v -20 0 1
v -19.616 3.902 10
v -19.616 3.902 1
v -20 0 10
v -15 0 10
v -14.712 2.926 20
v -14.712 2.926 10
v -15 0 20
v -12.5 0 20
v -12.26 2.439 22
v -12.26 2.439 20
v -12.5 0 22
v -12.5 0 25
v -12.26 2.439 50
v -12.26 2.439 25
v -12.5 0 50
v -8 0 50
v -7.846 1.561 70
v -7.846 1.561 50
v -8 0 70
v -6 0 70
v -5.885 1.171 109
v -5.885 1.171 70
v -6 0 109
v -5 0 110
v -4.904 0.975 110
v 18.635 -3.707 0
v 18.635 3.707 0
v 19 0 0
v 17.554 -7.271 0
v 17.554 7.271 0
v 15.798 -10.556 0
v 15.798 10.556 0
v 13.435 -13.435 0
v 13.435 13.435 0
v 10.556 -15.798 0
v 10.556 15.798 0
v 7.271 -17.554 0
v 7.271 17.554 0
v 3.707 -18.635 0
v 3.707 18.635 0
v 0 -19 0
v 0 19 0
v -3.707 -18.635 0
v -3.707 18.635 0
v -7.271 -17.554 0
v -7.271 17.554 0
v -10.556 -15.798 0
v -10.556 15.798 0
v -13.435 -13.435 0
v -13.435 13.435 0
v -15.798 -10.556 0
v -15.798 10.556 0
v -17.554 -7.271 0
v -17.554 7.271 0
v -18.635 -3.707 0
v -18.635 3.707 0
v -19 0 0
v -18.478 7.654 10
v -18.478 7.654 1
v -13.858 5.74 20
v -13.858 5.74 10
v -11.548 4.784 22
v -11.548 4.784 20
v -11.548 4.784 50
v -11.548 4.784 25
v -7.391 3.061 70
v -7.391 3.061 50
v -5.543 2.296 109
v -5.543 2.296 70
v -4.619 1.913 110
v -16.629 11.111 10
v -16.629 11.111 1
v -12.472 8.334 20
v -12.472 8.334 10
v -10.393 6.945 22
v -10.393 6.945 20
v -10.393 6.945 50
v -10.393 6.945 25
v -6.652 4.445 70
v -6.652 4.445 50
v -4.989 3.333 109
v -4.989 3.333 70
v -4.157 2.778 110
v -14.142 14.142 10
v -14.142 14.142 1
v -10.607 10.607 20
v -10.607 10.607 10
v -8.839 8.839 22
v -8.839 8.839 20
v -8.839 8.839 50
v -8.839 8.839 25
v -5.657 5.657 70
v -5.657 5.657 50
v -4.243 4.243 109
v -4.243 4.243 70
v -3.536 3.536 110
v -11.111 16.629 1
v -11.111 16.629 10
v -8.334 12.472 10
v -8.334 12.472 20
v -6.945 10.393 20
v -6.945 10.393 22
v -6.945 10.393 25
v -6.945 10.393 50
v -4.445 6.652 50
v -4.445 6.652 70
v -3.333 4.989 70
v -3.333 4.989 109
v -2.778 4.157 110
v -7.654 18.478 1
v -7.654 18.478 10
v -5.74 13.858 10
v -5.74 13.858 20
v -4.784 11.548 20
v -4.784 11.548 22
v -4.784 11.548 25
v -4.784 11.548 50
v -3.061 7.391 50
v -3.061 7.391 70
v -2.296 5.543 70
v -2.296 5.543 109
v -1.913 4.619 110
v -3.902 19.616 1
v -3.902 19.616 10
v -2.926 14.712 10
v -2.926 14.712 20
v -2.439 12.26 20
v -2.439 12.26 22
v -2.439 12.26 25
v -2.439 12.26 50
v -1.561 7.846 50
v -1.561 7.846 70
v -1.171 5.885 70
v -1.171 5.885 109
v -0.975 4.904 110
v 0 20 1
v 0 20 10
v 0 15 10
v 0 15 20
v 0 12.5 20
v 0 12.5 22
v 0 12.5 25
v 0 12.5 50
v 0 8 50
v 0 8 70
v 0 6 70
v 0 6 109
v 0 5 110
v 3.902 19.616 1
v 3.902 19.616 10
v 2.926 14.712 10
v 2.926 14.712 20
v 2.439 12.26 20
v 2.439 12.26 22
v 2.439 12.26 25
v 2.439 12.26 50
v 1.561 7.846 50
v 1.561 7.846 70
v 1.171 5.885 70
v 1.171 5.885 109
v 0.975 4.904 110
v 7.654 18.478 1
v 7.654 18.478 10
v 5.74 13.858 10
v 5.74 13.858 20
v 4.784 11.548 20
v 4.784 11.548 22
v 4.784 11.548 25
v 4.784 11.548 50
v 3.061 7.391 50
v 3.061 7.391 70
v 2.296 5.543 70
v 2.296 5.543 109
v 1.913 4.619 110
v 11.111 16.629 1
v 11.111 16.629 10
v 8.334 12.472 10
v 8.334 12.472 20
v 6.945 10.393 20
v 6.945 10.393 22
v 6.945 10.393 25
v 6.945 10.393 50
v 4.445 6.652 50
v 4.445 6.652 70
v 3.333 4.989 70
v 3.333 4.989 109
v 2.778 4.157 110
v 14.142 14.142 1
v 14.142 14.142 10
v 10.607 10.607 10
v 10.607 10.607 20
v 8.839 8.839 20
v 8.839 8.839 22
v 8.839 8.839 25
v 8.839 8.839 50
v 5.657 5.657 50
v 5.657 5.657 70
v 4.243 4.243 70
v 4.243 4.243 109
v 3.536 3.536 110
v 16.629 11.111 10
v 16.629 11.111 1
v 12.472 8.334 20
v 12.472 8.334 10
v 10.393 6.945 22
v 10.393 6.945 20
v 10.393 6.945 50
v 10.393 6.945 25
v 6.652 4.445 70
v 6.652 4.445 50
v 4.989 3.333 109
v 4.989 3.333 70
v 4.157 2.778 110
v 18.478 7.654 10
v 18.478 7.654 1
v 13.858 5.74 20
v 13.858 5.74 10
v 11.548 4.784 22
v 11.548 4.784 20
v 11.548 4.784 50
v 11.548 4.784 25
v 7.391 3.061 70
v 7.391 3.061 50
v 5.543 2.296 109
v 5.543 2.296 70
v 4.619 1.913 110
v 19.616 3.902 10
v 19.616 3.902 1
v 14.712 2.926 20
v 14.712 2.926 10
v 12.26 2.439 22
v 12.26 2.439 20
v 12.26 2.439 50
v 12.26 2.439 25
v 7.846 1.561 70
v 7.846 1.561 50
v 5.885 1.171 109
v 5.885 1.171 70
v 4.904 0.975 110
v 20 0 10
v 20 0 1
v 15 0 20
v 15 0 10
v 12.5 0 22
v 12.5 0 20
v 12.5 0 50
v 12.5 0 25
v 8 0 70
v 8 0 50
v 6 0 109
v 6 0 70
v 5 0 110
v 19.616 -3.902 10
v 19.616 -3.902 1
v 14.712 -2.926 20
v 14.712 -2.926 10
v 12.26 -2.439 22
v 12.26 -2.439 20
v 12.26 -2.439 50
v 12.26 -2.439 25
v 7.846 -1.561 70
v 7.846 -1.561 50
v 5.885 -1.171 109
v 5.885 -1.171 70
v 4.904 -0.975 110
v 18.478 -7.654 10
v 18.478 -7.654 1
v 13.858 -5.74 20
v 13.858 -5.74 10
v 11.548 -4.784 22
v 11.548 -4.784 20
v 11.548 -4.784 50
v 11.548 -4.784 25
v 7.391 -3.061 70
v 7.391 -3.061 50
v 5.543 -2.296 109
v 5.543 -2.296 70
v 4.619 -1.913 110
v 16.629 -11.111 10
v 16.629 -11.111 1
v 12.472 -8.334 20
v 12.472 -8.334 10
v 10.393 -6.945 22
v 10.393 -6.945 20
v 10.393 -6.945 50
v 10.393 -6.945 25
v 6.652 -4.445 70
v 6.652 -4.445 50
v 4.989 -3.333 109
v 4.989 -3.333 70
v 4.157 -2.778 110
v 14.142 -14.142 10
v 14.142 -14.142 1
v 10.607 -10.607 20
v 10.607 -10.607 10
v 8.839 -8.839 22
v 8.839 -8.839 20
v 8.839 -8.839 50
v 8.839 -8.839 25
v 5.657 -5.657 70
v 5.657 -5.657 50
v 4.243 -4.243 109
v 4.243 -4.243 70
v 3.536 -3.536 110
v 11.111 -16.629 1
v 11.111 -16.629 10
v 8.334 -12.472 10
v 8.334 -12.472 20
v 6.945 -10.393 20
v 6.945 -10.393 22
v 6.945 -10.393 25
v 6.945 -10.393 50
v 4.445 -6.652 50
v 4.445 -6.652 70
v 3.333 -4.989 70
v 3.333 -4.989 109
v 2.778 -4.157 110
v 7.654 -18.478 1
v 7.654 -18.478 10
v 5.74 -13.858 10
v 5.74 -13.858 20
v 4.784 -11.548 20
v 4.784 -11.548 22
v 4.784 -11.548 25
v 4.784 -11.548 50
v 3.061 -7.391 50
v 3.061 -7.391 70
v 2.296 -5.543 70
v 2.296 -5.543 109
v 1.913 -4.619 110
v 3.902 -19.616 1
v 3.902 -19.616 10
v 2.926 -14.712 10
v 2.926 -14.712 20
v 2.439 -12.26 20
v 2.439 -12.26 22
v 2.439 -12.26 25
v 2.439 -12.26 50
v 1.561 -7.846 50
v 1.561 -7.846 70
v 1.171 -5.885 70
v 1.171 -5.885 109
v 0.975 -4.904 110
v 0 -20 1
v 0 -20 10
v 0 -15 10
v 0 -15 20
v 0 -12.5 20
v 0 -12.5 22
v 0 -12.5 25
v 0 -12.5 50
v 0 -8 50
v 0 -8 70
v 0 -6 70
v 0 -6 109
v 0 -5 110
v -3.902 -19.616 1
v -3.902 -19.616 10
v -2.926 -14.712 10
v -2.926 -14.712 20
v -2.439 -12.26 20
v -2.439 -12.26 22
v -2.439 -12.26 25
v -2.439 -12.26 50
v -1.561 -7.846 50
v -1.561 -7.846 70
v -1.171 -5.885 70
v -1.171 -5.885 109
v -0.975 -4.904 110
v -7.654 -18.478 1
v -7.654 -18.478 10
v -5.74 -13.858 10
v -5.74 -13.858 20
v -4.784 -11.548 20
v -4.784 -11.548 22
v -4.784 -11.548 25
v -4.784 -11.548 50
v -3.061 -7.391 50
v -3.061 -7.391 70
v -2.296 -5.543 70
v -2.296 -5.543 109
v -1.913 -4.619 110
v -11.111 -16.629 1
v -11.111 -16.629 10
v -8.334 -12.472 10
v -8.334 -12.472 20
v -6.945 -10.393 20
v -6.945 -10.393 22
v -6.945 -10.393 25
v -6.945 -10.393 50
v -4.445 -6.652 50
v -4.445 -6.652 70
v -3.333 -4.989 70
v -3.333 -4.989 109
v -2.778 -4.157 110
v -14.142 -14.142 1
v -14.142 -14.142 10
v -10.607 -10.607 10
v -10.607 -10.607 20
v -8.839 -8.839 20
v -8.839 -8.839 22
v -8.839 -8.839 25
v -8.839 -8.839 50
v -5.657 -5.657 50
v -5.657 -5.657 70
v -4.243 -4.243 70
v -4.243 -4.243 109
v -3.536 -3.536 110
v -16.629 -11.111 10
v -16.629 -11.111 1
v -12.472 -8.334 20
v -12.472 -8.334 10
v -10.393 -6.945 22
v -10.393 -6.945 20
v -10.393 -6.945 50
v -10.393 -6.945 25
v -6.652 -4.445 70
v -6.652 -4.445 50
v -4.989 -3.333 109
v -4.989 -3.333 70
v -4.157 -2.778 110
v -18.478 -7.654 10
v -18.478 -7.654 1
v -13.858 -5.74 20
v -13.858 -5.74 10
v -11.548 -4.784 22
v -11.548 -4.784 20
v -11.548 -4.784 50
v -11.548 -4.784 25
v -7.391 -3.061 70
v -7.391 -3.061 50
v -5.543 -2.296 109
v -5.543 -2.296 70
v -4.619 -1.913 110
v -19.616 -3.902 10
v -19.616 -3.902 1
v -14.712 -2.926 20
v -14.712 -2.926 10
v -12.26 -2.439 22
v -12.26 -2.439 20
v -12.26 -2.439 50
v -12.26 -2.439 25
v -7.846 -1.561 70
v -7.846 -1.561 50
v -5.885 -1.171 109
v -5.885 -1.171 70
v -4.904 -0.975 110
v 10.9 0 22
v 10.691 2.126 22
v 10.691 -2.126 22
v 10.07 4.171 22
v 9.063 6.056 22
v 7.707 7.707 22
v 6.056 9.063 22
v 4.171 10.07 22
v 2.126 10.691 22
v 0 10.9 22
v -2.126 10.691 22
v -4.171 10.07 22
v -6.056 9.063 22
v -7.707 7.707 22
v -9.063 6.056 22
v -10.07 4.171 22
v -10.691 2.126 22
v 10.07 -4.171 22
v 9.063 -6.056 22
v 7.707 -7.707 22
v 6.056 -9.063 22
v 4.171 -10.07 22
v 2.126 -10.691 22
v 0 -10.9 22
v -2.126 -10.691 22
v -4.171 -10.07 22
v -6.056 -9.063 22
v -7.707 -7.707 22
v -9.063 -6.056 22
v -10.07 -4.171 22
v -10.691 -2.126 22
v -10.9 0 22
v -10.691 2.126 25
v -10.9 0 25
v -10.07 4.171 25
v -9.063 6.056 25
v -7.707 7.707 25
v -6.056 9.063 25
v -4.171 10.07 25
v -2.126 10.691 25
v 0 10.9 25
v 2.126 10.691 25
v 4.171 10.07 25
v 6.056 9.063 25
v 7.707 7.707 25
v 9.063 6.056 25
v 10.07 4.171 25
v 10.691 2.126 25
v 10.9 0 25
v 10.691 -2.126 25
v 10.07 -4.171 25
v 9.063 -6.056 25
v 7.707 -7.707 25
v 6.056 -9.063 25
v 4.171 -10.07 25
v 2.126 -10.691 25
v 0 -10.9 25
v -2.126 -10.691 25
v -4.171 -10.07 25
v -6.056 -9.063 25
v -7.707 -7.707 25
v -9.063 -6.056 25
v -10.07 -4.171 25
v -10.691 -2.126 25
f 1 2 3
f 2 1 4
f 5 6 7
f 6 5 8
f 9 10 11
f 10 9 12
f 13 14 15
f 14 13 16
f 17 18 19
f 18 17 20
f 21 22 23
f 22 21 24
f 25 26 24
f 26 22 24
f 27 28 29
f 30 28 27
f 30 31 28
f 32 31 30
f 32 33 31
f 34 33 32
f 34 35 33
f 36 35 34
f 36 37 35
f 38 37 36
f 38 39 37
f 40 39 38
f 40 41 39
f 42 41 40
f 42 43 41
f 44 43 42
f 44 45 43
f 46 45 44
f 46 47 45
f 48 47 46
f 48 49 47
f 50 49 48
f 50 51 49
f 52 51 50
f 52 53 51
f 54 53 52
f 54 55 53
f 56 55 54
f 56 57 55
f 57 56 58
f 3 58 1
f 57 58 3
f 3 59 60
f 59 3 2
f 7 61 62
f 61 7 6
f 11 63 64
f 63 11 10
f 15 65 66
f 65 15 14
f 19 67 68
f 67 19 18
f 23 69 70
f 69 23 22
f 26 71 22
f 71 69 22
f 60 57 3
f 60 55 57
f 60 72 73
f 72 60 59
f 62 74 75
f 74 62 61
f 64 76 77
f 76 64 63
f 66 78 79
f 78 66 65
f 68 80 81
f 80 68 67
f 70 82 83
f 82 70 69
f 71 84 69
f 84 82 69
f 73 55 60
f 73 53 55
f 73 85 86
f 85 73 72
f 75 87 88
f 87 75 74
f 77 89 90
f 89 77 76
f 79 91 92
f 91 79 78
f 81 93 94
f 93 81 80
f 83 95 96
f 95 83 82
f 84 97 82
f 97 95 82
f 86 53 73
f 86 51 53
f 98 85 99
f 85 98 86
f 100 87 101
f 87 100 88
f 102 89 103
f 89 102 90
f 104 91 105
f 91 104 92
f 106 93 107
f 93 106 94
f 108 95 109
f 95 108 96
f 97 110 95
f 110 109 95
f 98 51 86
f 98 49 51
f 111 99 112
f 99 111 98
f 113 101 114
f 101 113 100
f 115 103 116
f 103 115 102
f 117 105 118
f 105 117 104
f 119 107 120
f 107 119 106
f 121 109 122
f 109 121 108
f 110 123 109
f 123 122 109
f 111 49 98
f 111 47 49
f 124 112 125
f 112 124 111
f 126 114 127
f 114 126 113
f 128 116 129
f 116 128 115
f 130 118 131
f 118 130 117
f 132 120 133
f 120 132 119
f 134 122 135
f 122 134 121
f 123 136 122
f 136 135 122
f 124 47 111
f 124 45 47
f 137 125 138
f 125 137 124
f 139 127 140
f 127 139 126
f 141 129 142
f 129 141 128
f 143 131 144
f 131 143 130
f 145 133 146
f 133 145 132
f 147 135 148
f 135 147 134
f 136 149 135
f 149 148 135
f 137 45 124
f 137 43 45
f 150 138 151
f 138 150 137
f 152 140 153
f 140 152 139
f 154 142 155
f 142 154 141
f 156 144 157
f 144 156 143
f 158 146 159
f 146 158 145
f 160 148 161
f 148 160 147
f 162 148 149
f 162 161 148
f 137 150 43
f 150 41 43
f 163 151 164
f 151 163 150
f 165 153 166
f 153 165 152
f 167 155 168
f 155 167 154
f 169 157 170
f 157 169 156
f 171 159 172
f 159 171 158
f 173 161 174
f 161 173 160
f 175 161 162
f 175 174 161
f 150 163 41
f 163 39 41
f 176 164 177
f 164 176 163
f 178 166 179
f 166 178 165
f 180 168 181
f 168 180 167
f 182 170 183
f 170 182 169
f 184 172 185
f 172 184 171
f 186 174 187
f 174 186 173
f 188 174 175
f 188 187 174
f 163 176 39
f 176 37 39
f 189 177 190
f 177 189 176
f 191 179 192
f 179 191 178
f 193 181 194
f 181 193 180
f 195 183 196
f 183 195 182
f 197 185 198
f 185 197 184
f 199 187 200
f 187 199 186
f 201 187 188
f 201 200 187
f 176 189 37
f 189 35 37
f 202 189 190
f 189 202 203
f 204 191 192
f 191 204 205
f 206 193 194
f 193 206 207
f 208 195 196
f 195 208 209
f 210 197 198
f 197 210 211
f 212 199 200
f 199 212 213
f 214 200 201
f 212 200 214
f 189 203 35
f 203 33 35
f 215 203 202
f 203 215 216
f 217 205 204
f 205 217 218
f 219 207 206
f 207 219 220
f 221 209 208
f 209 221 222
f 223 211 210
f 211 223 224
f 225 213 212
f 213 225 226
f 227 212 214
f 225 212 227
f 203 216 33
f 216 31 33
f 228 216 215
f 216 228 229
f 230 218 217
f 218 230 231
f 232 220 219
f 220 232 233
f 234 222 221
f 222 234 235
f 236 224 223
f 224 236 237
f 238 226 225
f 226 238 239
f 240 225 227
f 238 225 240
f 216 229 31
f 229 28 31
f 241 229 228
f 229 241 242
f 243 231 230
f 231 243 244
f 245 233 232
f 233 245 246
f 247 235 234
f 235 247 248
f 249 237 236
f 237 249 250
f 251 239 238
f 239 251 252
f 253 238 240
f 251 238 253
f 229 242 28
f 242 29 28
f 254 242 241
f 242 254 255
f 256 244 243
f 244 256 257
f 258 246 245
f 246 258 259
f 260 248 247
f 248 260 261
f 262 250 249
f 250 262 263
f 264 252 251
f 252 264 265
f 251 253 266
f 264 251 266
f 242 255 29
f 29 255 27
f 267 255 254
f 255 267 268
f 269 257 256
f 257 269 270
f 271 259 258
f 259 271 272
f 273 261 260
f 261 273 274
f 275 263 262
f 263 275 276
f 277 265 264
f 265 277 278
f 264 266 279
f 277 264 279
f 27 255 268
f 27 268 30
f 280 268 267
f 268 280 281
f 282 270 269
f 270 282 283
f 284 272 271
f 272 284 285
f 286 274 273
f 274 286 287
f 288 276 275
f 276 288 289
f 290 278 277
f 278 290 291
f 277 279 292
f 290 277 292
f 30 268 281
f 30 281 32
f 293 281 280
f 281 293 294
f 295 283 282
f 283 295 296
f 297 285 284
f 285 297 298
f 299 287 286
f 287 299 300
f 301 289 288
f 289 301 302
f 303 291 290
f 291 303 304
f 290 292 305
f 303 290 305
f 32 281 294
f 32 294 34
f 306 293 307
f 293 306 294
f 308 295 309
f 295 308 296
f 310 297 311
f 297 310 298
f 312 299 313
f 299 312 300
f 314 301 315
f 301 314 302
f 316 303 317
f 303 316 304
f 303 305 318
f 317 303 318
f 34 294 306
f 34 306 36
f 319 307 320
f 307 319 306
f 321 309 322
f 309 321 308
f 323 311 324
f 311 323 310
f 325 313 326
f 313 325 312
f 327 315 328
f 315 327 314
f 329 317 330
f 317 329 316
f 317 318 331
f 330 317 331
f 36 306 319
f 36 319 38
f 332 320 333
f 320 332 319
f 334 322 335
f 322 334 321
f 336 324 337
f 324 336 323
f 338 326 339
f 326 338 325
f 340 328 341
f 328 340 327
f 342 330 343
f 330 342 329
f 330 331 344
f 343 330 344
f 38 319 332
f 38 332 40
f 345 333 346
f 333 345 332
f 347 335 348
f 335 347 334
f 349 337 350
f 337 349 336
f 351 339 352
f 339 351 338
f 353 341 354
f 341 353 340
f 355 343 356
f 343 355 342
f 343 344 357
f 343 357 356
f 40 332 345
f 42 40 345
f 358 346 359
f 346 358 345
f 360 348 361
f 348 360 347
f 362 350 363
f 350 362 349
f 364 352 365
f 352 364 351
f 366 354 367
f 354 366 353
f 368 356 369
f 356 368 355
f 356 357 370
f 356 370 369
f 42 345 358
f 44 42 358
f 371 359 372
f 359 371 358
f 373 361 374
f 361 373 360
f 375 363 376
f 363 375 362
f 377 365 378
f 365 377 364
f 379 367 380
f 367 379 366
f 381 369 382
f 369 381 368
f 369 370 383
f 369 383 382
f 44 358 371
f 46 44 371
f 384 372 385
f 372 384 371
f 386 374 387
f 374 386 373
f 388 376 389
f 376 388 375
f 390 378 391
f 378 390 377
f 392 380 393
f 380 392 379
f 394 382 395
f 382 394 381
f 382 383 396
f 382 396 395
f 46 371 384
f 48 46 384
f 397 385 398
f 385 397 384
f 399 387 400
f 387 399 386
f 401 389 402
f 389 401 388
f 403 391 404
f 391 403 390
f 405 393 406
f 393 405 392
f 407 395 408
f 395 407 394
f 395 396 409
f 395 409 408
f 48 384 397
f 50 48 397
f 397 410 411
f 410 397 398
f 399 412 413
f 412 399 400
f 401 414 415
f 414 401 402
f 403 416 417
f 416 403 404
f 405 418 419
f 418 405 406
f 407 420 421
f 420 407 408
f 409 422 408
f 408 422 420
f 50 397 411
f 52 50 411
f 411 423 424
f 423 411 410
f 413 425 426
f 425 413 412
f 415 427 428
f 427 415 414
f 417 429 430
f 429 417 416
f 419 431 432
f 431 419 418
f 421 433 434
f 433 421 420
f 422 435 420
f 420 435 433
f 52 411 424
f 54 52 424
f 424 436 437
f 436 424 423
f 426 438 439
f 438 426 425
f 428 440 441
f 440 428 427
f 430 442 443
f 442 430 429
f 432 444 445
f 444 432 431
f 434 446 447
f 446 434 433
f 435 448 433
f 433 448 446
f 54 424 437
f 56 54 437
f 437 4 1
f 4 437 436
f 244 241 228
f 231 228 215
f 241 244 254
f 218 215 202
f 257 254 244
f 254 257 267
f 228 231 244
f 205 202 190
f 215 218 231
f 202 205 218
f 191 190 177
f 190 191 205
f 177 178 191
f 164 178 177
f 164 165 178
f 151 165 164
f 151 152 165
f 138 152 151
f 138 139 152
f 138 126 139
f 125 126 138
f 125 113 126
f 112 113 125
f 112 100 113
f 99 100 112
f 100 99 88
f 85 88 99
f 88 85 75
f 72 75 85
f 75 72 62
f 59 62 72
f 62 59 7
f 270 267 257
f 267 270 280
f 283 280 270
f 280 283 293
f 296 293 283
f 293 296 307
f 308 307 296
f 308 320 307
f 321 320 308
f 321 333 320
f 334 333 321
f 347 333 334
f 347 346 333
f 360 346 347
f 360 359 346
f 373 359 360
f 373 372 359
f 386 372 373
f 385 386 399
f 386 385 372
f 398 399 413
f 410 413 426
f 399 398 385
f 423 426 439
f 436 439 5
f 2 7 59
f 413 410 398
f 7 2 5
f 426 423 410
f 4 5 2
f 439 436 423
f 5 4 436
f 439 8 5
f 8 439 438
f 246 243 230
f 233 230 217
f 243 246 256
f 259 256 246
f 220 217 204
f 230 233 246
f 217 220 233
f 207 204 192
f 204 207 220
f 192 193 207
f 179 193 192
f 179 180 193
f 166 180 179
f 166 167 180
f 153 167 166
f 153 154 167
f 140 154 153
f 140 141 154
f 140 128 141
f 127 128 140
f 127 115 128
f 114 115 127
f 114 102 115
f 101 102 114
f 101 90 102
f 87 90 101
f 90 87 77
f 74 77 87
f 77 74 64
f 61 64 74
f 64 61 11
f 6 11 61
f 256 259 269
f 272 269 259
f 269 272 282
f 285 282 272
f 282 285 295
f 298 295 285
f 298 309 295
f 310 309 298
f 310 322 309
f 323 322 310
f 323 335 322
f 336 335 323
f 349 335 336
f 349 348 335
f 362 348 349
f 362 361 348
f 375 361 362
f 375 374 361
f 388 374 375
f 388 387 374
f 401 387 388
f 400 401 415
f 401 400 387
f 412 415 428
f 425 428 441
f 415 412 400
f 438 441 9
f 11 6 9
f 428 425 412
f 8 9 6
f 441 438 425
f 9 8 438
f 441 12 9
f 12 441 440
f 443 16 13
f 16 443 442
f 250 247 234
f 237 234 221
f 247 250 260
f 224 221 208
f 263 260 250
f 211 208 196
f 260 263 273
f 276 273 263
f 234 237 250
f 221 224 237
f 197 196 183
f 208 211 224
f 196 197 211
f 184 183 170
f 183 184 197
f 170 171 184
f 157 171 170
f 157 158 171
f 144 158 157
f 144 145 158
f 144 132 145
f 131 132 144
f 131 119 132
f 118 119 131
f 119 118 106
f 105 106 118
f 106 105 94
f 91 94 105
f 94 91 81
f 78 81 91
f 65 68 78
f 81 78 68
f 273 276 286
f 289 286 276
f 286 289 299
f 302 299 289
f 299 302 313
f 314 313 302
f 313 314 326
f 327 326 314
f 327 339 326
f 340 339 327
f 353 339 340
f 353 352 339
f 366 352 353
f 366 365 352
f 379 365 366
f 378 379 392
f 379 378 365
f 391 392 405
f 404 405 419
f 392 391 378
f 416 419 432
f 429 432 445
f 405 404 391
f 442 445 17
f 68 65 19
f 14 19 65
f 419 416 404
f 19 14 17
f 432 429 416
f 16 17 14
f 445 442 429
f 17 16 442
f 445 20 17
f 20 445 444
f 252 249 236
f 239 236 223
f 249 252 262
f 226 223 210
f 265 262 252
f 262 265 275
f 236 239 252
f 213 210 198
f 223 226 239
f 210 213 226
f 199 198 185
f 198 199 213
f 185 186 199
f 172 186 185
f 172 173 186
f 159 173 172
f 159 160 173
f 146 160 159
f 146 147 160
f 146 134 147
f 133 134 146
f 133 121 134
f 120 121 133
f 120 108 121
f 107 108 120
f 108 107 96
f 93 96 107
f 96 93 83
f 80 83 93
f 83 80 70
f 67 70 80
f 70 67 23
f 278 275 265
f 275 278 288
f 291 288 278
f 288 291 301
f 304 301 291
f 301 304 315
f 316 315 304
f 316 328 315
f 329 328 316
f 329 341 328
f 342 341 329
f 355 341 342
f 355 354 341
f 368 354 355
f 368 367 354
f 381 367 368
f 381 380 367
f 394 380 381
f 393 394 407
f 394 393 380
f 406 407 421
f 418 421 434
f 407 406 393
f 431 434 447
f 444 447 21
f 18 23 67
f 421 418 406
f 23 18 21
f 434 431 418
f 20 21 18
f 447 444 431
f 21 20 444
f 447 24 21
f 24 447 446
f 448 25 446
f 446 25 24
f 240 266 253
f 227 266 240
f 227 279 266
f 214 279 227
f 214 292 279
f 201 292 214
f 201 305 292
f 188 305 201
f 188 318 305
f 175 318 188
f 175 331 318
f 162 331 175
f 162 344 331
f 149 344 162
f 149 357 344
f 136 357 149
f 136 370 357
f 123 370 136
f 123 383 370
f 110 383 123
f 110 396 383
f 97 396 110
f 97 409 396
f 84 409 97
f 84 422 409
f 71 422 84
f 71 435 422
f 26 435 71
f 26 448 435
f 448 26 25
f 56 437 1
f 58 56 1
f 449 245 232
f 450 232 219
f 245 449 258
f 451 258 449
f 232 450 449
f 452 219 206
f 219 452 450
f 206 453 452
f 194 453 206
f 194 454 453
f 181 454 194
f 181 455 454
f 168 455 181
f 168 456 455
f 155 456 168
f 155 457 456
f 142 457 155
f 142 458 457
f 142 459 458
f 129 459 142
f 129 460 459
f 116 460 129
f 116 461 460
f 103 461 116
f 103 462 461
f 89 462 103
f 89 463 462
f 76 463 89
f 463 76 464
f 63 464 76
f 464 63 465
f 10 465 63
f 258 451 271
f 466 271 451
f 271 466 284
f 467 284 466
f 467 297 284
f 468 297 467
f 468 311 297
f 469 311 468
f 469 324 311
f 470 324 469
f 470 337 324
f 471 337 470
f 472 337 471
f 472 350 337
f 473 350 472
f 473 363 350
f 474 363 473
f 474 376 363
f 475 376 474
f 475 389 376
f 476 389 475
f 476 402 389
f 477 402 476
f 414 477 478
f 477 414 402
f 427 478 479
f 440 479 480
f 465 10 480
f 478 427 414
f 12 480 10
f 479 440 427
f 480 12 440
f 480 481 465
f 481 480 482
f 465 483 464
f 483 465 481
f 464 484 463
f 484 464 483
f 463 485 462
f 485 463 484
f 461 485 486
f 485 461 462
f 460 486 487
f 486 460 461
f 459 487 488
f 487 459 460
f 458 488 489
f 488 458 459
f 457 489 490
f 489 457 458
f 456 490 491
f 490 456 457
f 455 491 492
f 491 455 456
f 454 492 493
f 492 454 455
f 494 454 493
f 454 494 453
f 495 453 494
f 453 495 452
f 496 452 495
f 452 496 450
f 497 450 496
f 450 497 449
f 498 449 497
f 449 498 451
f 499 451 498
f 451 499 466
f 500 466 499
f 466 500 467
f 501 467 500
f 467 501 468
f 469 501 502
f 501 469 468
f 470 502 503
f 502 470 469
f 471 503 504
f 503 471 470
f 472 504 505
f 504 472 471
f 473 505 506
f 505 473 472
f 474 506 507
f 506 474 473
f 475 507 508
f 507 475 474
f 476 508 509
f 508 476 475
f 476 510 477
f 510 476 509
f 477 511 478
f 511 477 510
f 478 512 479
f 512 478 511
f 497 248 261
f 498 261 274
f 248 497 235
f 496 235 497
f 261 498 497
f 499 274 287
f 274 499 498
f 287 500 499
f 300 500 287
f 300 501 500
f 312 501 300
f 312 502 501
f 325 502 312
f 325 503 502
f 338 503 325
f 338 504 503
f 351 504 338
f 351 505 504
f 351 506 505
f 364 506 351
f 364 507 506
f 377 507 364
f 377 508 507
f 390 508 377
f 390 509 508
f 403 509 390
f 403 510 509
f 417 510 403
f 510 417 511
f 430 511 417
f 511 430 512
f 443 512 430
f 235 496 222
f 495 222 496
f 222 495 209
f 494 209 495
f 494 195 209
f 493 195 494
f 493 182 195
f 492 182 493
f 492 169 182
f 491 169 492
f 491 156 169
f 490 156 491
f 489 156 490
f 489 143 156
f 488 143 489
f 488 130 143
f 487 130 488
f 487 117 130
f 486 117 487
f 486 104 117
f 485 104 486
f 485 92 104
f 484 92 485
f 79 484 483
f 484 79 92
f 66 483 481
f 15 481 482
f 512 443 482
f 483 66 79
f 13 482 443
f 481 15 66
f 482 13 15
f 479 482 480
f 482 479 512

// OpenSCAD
$fn = 32;

// ----------------------------------------------------------------------
// Stepped shaft: diameters 40, 30, 25, 16, 12 mm, 110 mm long
// ----------------------------------------------------------------------

// --- parameters (mm) ---
d1 = 40;                  // step 1 diameter
len1 = 10;                // step 1 length
d2 = 30;                  // step 2 diameter
len2 = 10;                // step 2 length
d3 = 25;                  // step 3 diameter
len3 = 30;                // step 3 length
d4 = 16;                  // step 4 diameter
len4 = 20;                // step 4 length
d5 = 12;                  // step 5 diameter
len5 = 40;                // step 5 length
total = 110;              // overall length
chamfer = 1;              // end chamfer
groove_r = 12.5;          // groove radius
groove_z = 22;            // groove position from the end
groove_w = 3;             // groove width
groove_d = 1.6;           // groove depth

/* closed turning profile: x is the radius, y is the length */
profile = [[0, 0], [20 - chamfer, 0], [20, chamfer], [20, 10], [15, 10], [15, 20], [12.5, 20], [12.5, 50], [8, 50], [8, 70], [6, 70], [6, 109], [5, 110], [0, 110]];

difference() {
  rotate_extrude() polygon(profile);
  /* circlip groove just behind the shoulder */
  rotate_extrude() translate([groove_r - groove_d, groove_z]) square([groove_d + 1, groove_w]);
}
